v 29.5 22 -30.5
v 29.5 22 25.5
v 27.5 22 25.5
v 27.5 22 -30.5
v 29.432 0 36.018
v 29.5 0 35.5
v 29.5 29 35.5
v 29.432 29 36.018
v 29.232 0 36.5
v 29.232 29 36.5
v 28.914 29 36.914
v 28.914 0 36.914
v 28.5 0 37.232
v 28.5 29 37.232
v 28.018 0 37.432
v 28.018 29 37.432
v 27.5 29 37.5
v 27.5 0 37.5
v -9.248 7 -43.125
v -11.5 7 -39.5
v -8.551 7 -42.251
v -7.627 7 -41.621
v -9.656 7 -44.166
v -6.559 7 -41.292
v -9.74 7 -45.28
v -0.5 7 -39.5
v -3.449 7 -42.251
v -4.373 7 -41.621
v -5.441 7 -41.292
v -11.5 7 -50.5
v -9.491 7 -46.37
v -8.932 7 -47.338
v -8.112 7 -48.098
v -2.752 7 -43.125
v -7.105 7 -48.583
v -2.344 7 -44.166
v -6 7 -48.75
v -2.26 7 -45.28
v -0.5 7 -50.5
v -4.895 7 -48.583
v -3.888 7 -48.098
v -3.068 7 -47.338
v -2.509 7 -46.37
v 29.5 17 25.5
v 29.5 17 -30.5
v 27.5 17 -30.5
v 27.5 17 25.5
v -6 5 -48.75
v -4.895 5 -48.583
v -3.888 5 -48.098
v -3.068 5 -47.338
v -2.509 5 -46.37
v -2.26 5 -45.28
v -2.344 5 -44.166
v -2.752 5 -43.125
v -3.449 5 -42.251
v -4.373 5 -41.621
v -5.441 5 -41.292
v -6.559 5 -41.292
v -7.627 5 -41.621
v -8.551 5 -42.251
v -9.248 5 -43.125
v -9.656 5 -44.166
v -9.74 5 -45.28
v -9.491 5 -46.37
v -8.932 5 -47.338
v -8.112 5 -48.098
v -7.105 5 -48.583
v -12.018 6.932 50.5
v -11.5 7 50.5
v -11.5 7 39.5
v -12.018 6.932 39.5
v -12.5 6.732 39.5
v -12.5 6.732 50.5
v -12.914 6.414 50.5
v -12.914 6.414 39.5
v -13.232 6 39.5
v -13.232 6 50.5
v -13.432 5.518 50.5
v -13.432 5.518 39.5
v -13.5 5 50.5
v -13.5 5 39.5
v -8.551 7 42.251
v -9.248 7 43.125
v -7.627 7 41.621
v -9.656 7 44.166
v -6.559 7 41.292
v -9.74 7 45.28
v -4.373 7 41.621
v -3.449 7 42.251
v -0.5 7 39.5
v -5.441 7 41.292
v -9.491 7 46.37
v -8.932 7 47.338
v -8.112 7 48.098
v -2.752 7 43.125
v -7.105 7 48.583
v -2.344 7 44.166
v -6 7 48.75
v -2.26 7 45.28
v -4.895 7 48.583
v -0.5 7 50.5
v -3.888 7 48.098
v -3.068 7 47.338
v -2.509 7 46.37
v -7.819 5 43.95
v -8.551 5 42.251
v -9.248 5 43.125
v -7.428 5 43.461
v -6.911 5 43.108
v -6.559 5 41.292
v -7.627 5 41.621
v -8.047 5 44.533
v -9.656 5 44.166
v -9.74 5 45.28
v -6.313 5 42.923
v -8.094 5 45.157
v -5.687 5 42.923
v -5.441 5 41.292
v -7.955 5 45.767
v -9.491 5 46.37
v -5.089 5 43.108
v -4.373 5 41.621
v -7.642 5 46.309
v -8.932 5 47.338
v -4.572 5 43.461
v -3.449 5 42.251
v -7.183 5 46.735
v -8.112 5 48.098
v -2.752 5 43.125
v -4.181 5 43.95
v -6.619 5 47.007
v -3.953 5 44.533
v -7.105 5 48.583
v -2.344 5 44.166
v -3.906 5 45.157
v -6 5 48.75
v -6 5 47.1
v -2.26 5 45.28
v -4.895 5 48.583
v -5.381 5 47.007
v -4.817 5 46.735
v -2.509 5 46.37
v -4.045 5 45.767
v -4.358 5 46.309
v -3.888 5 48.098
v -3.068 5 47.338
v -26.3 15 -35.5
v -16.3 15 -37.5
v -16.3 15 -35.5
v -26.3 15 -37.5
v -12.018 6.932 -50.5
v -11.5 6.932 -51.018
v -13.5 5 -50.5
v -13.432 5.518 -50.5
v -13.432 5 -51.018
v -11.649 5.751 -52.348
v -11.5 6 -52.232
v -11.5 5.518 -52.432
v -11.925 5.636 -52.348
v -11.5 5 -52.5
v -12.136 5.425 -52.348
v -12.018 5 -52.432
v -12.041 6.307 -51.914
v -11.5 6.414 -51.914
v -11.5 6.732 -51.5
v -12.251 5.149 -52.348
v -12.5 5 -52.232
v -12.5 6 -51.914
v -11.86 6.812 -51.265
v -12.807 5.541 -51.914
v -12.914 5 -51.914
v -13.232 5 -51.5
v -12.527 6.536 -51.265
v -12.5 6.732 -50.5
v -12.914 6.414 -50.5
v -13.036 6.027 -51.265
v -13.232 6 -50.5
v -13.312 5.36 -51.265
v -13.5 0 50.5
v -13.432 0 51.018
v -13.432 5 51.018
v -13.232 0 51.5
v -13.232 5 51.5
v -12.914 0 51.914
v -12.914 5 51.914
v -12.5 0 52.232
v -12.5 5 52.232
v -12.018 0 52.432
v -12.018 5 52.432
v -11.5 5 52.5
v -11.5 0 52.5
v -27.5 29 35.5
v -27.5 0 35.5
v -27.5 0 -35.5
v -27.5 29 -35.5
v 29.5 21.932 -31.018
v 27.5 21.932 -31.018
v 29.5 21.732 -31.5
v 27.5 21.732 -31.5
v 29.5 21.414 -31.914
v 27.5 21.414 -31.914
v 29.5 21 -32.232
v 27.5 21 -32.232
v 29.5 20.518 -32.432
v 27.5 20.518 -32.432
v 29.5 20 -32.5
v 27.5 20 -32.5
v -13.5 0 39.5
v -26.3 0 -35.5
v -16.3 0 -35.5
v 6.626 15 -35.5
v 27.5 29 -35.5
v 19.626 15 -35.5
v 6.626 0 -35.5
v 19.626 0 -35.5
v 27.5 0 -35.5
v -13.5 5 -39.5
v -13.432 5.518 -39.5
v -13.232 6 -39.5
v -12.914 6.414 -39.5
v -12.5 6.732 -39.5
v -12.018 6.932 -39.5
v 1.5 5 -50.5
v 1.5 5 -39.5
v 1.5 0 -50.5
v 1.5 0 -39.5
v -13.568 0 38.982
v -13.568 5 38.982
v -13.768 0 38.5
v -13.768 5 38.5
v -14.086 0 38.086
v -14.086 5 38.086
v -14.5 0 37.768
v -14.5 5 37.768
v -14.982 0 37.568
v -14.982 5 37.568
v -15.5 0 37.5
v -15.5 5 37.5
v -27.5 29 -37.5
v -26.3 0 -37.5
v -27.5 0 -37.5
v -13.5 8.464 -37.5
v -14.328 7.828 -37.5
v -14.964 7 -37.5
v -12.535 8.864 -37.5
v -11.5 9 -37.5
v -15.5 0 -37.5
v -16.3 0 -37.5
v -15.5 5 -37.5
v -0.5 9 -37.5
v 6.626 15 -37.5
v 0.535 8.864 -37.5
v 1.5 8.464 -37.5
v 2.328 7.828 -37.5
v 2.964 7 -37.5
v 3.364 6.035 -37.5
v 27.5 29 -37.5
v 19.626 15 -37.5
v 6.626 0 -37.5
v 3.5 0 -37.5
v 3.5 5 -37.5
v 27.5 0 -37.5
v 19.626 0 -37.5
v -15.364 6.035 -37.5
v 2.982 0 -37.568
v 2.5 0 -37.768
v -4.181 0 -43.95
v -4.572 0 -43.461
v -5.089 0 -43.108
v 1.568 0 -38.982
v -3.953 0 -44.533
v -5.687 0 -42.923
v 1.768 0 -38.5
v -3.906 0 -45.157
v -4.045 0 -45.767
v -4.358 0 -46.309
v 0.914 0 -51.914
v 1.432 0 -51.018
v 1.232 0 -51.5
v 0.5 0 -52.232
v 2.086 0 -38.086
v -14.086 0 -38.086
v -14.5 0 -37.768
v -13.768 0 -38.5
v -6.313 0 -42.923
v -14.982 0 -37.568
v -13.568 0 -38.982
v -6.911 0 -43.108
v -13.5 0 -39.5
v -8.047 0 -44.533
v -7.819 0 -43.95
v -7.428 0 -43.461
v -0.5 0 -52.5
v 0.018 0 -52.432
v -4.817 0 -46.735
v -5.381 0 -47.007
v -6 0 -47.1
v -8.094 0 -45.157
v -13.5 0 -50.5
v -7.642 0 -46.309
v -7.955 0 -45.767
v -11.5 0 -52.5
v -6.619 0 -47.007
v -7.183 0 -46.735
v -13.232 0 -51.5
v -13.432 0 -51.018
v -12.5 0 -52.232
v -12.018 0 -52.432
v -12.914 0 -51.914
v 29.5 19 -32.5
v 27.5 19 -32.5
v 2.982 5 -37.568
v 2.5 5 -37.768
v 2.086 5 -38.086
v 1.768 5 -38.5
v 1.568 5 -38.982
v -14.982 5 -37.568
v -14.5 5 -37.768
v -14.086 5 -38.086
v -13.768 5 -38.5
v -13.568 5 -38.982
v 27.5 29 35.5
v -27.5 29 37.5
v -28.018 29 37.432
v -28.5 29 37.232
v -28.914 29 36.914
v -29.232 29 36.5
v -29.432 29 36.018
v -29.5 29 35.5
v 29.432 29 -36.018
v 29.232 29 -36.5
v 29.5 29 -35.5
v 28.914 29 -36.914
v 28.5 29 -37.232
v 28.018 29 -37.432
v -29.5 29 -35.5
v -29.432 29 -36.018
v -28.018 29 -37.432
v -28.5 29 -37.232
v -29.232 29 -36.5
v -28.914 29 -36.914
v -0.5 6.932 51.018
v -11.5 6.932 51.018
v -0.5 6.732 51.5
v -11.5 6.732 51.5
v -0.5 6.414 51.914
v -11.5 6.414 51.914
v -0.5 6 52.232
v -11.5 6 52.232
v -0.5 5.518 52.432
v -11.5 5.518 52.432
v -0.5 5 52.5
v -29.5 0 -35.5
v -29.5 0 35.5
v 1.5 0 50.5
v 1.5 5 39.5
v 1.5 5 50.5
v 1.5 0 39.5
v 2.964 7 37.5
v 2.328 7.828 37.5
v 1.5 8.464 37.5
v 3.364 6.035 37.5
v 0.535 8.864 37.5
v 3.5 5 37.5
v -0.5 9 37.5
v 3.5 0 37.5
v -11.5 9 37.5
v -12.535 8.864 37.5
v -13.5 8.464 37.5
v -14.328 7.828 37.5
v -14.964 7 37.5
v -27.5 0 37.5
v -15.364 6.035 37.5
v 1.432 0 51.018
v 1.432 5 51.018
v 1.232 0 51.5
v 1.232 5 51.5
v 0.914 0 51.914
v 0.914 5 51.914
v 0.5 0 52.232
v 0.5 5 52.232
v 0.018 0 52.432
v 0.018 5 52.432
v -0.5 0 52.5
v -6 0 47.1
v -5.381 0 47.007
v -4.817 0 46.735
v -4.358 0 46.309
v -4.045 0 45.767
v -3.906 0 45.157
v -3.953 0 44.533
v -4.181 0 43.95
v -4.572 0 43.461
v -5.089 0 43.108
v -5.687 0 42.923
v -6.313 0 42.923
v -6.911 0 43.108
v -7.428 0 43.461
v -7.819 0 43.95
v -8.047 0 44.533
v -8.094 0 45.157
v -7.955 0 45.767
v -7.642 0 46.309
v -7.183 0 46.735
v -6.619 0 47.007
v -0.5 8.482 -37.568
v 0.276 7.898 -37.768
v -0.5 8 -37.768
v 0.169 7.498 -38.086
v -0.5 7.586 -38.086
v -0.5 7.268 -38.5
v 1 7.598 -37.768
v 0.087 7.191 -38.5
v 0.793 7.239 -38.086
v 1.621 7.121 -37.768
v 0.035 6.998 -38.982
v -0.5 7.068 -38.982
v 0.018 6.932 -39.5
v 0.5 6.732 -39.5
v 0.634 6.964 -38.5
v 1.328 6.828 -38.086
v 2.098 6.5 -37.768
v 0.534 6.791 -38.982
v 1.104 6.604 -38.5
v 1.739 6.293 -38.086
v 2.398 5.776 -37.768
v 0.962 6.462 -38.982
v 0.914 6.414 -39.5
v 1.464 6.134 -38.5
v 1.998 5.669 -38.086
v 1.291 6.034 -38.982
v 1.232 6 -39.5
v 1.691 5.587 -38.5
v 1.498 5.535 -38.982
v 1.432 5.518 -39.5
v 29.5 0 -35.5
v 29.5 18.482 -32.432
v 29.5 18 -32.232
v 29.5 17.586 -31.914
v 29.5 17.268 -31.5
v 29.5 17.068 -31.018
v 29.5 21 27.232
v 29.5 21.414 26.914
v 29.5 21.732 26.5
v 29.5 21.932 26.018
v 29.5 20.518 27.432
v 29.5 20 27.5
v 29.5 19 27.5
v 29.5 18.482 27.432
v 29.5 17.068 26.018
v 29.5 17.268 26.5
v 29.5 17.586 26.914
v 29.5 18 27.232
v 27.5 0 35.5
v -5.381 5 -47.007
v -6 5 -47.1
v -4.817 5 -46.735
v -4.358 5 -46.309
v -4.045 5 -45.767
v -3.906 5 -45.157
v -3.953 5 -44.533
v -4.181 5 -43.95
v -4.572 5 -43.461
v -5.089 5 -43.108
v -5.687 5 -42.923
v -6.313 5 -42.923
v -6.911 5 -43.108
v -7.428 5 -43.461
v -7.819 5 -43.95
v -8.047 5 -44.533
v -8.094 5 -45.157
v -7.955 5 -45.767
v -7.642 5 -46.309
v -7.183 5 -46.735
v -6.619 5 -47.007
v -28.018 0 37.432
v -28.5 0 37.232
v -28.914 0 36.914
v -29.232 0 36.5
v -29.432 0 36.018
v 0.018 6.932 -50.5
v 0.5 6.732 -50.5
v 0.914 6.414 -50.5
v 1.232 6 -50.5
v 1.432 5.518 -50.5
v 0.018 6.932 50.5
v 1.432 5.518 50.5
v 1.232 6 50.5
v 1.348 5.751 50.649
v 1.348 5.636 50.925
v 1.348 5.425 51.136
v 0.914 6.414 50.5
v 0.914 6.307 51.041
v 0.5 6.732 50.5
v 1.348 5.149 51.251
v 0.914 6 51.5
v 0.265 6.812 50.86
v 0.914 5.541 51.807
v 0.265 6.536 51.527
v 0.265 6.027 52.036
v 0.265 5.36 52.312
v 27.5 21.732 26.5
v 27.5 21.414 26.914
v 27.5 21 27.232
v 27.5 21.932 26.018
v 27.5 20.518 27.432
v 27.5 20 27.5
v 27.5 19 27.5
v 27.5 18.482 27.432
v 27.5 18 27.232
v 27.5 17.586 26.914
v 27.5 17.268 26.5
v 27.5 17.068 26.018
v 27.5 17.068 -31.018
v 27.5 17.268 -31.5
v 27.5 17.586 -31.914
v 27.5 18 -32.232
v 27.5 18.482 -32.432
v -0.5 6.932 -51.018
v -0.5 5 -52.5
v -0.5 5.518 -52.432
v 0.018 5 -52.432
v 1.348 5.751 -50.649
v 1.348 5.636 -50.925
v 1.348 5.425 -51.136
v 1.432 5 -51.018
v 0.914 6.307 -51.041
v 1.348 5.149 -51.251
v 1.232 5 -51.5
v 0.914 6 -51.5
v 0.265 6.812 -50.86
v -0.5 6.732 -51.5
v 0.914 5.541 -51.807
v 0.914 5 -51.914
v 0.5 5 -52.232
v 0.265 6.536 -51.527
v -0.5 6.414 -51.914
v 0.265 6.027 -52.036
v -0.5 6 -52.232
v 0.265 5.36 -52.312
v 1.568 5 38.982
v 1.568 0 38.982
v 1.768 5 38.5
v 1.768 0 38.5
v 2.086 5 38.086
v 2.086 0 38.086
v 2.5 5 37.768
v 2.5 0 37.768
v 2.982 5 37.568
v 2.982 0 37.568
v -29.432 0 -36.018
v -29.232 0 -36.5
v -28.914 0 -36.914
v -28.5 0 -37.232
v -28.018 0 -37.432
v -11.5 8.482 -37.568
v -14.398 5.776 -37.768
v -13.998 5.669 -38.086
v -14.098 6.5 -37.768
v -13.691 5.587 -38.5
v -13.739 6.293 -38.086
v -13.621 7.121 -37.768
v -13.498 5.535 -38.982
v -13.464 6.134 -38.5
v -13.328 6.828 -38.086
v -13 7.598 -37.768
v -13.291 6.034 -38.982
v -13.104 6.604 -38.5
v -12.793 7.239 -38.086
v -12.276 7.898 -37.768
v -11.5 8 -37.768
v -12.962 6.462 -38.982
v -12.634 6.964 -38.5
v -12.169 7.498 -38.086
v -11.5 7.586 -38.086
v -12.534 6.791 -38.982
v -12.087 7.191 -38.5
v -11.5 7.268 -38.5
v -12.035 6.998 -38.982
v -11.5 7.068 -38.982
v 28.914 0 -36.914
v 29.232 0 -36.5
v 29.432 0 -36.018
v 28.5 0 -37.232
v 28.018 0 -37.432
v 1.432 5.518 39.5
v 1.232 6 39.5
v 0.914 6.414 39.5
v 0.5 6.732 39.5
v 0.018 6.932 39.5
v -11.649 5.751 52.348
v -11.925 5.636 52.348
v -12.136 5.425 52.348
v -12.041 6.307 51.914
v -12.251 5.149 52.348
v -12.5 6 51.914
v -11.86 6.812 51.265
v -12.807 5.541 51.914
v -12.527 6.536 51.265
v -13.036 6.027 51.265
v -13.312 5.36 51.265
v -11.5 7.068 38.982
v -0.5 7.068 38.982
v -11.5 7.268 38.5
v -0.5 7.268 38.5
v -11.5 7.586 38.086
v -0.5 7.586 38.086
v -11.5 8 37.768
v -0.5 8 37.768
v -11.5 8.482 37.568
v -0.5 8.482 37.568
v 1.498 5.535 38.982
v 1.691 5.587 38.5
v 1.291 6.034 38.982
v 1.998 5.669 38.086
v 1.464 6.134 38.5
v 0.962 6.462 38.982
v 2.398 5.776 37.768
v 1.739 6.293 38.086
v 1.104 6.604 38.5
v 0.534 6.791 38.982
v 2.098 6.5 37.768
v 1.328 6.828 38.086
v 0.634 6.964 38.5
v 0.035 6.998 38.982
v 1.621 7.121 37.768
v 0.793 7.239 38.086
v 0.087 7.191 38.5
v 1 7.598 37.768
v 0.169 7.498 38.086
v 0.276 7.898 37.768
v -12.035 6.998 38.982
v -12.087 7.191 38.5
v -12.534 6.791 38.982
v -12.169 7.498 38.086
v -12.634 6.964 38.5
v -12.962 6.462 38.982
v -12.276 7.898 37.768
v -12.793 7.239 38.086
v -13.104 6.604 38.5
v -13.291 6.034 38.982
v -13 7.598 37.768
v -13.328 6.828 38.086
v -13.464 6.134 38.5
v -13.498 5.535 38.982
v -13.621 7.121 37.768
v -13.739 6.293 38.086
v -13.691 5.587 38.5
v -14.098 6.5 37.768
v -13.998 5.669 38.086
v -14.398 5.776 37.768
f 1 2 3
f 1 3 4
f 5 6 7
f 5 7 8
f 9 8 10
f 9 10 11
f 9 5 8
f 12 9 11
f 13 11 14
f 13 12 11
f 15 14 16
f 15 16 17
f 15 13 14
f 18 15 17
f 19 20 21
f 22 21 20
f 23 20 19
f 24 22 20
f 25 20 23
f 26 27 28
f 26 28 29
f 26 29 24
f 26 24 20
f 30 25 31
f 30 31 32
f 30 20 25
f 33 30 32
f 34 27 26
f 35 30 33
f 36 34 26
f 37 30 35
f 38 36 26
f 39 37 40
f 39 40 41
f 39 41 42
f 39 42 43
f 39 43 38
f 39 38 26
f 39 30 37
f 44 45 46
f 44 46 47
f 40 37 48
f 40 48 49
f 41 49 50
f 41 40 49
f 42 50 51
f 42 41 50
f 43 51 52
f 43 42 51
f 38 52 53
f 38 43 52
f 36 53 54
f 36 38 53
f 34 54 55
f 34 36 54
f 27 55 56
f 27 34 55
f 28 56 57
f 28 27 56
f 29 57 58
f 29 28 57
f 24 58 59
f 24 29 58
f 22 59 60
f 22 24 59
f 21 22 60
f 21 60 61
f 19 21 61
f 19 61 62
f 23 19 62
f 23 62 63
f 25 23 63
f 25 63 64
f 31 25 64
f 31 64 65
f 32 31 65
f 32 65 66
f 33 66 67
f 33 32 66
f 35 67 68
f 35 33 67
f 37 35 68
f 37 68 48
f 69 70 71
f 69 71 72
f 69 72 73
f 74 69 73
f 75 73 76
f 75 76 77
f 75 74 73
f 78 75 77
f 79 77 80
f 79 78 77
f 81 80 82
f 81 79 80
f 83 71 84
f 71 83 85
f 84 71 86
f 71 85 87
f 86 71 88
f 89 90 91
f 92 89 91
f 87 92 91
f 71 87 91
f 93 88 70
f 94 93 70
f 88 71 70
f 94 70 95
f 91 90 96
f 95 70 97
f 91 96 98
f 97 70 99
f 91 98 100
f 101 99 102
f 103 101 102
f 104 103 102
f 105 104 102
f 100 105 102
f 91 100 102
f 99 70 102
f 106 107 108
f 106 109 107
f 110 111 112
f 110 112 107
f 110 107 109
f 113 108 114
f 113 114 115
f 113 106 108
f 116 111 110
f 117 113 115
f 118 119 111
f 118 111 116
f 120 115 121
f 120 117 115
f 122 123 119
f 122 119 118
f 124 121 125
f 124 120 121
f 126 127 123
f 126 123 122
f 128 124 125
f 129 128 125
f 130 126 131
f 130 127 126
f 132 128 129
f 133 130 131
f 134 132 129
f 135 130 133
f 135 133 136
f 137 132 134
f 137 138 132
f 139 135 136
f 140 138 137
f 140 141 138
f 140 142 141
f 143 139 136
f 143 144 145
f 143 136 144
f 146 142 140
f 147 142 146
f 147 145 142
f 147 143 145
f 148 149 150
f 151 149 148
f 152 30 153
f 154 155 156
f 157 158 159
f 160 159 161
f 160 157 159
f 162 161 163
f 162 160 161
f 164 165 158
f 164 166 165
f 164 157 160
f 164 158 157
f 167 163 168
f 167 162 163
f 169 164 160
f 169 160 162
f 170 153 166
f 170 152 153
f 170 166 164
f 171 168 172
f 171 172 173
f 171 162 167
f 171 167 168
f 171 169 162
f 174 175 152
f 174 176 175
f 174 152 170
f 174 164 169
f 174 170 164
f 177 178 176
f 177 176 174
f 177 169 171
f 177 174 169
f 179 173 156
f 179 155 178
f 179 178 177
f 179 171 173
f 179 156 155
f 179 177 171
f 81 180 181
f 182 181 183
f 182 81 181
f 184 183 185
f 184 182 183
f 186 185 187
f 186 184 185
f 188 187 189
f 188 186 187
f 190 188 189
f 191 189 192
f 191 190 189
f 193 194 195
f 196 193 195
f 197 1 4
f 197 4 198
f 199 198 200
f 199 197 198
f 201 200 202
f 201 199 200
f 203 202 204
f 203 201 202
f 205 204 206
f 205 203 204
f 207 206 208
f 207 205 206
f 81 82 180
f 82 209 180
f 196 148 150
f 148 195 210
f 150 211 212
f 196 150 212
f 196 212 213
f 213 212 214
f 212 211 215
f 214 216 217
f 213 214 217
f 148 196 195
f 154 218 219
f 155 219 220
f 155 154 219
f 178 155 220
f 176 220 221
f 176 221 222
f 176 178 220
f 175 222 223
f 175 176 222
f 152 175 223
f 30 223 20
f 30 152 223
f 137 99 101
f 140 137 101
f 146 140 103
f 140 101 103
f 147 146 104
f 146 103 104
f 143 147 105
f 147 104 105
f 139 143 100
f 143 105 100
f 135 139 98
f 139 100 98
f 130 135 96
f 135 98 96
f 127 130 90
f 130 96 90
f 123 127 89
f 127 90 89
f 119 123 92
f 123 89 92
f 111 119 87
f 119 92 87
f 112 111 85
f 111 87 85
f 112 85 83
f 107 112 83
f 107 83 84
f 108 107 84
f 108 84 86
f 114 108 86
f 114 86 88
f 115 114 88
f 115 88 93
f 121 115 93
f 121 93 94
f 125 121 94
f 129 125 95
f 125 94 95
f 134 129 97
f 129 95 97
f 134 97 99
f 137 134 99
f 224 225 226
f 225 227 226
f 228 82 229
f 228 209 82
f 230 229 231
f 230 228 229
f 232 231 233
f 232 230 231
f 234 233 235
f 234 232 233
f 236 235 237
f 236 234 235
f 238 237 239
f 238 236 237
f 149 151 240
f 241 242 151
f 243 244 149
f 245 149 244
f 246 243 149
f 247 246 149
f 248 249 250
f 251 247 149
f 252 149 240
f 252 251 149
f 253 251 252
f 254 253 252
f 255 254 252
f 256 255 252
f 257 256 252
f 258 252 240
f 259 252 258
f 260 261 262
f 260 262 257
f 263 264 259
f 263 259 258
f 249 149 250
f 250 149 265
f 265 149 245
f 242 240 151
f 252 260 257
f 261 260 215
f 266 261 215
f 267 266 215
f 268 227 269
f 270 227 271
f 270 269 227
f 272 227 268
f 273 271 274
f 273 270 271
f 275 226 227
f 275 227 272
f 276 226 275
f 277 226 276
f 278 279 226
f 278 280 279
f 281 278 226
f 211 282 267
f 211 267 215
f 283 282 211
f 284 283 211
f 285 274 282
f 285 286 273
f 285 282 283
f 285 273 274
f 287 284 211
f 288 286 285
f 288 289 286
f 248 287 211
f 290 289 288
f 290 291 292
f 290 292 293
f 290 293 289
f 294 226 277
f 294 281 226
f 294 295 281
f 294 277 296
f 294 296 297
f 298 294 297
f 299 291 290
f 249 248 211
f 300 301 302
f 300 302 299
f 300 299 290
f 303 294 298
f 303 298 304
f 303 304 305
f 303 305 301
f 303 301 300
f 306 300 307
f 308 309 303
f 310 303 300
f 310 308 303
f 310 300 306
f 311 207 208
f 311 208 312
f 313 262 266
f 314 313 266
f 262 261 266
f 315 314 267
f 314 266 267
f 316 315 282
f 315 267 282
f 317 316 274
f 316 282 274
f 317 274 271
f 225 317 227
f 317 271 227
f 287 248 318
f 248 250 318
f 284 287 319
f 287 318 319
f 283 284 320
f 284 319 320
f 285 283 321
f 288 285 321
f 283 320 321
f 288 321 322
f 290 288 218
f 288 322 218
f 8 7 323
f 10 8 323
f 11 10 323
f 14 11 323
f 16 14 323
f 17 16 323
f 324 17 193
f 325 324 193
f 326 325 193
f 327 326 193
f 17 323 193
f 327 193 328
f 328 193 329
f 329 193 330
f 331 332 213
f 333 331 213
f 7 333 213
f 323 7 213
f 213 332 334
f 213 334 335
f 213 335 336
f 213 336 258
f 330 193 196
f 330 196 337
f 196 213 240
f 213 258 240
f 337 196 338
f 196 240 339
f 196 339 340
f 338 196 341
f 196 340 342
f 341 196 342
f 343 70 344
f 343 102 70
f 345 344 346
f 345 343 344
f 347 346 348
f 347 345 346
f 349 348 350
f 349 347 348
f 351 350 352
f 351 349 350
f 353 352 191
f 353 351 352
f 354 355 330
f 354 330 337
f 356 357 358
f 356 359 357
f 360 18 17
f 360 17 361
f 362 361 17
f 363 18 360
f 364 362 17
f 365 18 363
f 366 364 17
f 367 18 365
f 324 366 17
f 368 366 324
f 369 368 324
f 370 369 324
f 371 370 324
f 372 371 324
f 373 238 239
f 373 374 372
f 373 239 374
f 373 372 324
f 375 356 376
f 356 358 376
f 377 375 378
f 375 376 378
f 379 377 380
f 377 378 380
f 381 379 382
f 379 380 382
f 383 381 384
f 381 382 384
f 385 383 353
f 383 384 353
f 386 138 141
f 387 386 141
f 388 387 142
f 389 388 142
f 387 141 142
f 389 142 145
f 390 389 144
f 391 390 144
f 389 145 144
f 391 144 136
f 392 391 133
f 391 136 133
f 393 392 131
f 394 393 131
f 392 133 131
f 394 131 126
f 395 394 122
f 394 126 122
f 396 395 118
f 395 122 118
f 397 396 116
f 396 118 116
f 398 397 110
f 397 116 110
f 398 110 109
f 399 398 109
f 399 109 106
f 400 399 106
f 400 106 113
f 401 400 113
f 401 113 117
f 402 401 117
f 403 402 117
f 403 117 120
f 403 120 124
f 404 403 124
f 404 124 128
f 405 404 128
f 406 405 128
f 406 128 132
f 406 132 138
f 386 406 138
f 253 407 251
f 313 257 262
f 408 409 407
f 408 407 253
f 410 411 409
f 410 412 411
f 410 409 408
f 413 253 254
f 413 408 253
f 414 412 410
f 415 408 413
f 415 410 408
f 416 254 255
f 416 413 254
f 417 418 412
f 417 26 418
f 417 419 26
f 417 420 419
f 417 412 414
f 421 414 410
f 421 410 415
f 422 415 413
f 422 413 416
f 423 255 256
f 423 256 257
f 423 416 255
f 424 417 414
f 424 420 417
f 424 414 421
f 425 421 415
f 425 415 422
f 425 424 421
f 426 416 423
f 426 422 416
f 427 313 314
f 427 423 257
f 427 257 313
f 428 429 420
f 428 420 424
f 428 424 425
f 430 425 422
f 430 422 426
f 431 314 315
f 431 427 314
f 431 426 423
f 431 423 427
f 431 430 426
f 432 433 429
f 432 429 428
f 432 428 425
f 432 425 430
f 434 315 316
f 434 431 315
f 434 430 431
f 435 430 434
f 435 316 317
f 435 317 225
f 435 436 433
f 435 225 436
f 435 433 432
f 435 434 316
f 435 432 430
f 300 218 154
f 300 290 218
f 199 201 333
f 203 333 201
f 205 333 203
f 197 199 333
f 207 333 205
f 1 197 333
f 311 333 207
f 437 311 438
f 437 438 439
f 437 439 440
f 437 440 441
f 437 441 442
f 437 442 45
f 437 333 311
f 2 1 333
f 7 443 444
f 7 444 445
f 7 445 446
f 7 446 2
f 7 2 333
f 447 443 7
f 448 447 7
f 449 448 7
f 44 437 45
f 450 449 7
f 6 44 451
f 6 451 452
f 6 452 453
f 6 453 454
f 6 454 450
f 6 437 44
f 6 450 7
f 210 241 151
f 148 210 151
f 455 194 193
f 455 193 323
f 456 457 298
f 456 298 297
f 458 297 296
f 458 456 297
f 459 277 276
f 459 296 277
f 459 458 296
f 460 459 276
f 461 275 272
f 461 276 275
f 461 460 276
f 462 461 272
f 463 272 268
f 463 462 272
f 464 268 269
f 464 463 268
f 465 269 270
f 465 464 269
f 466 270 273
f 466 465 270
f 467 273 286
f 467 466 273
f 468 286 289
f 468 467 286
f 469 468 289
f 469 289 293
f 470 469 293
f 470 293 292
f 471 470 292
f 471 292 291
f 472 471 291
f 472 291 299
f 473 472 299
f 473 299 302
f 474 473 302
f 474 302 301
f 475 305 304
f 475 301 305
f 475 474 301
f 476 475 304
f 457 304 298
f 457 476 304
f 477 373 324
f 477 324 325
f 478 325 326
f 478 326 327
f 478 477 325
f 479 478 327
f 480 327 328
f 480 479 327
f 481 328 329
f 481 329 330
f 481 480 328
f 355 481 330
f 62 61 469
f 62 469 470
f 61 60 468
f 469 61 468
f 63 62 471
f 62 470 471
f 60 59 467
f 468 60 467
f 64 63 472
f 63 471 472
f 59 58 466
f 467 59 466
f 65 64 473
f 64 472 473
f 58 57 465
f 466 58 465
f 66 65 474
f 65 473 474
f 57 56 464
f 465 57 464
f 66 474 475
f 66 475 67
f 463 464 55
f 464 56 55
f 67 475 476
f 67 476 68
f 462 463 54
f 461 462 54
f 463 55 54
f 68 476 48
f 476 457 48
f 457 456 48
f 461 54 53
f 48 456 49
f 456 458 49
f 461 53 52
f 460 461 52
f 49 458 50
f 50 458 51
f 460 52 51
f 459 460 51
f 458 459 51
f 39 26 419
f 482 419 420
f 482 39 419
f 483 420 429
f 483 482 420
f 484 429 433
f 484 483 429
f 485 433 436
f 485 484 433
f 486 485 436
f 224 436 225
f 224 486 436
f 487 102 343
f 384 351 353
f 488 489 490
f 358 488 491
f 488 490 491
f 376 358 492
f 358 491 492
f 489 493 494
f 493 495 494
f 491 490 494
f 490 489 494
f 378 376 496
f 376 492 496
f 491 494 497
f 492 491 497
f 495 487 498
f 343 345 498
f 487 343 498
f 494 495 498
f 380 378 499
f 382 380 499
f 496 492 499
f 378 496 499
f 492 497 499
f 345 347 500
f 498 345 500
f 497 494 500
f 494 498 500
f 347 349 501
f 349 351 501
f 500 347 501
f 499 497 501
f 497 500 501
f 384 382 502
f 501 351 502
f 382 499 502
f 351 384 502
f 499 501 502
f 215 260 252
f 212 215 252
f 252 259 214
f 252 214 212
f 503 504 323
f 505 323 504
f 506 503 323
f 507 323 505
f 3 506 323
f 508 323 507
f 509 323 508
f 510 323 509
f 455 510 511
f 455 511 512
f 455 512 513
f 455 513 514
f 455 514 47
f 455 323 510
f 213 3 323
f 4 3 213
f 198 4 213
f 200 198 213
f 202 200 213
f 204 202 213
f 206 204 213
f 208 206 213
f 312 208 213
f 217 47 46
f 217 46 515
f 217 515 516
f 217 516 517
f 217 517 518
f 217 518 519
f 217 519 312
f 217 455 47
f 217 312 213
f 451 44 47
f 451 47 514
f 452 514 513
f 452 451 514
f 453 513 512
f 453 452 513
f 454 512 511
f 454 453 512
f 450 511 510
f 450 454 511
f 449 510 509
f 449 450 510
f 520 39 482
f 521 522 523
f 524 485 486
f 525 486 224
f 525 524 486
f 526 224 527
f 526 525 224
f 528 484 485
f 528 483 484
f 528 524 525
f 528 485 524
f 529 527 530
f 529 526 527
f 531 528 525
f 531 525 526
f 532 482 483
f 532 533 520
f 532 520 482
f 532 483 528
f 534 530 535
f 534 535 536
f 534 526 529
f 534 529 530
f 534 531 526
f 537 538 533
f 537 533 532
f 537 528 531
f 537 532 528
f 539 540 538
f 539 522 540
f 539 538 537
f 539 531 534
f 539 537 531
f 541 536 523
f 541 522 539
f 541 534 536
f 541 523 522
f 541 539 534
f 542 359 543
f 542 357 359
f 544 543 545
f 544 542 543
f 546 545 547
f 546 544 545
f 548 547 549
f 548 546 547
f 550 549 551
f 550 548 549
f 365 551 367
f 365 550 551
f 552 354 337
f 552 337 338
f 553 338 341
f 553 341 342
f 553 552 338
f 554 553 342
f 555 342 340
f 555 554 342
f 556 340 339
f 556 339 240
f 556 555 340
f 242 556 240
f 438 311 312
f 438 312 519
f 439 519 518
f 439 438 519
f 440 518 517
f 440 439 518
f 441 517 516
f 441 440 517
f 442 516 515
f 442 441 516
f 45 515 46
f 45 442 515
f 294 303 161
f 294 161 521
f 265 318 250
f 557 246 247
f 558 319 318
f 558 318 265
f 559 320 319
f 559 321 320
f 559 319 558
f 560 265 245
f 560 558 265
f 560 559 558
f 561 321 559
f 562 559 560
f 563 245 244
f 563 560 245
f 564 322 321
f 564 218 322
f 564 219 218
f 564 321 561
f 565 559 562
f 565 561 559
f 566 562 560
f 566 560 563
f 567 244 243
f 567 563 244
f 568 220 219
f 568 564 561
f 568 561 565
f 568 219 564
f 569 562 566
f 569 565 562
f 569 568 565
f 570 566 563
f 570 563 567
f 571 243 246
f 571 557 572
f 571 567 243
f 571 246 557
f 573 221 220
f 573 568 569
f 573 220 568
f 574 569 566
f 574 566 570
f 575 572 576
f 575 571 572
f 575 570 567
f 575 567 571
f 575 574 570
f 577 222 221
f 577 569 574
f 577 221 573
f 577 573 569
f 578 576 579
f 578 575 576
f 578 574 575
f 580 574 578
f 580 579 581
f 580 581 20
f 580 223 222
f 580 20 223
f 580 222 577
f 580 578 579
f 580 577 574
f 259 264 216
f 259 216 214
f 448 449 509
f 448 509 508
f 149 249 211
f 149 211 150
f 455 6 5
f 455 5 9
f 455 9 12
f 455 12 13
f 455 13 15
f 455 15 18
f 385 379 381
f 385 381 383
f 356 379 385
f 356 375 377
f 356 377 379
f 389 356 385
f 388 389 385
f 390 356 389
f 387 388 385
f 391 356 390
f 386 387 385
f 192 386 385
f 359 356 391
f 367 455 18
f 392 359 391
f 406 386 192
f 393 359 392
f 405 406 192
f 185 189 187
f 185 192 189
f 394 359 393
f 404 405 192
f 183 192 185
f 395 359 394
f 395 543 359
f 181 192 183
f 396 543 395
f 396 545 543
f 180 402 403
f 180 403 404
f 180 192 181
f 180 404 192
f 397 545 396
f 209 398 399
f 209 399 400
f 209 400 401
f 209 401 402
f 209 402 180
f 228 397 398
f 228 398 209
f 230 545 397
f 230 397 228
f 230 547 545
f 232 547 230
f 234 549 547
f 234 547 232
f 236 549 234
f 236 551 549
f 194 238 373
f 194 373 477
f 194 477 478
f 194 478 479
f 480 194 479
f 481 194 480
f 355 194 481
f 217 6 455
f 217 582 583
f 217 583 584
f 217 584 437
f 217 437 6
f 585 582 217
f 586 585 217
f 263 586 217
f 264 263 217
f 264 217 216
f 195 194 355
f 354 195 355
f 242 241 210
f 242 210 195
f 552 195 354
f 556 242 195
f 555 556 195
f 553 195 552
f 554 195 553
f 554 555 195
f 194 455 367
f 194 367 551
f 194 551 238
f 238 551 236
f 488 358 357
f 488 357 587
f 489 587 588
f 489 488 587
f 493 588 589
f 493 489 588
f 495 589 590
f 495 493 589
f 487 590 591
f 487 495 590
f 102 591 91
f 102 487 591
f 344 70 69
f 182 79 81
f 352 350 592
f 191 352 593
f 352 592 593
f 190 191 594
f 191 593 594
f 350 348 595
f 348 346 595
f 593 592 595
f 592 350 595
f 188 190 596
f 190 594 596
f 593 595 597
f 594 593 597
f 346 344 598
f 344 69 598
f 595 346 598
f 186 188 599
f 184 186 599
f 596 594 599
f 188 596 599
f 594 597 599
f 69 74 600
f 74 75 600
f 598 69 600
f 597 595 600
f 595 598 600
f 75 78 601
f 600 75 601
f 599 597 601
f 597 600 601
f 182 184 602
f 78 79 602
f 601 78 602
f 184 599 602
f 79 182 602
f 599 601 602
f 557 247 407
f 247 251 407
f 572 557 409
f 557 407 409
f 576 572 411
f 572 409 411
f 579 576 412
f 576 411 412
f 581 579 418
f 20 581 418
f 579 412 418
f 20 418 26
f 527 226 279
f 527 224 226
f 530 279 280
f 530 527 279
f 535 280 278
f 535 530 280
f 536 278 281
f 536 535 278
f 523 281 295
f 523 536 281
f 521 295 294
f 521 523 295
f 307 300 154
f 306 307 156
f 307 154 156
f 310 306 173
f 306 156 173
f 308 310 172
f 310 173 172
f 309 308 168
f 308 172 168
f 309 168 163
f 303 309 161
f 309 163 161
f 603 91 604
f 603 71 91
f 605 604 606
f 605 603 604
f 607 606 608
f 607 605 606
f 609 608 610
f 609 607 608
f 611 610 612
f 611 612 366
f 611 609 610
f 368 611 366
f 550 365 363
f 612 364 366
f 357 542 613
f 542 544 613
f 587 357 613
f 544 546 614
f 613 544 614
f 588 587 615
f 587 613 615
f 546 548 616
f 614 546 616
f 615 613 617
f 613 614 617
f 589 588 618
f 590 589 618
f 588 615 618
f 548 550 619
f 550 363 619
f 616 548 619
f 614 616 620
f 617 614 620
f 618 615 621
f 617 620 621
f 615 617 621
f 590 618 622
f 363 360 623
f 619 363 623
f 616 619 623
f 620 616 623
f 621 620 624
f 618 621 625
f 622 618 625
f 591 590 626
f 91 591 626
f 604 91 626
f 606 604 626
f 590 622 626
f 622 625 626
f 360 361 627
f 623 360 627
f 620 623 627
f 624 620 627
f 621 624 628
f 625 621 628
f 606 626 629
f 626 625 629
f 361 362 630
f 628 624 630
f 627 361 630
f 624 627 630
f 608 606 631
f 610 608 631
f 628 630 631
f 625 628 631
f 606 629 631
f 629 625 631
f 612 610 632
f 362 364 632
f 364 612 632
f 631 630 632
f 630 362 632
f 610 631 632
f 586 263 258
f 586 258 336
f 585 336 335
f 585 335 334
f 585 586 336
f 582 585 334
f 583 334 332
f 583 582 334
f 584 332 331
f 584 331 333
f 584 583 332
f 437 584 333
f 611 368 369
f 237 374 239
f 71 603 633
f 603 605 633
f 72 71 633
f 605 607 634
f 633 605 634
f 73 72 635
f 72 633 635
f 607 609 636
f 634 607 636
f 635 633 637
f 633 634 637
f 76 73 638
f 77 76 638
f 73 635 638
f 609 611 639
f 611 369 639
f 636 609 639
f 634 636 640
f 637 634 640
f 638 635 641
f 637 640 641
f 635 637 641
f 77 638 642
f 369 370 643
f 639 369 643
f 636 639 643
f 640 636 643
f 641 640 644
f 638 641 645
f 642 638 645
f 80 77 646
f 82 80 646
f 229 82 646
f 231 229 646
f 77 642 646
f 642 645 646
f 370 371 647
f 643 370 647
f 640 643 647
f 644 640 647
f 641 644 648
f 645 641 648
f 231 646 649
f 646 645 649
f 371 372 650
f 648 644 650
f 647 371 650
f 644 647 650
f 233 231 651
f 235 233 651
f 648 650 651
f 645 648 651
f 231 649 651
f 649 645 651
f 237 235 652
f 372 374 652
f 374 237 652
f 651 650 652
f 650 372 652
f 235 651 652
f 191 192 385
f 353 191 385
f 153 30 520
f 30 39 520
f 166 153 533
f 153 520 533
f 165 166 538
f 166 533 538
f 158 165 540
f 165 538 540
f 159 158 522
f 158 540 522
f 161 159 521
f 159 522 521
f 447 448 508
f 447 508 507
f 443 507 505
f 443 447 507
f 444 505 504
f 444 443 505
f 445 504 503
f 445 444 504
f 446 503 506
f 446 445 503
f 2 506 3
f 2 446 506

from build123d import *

# Parameters (mm, degrees)
SKETCH1_W            = 55
SKETCH1_H            = 71
BOSS_EXTRUDE1_DEPTH  = 29
SKETCH2_W            = 13
SKETCH2_H            = 15
SKETCH2_W_2          = 10
CUT_EXTRUDE1_DEPTH   = 27
CUT_EXTRUDE2_DEPTH   = 27
SKETCH4_W            = 15
SKETCH4_H            = 15
BOSS_EXTRUDE2_DEPTH  = 7
FILLET1_R            = 2
SKETCH5_R            = 2.1
CUT_EXTRUDE3_DEPTH   = 15
SKETCH6_R            = 3.75
CUT_EXTRUDE4_DEPTH   = 2
FILLET1_OF_MIRROR2_R = 2
FILLET2_R            = 2


with BuildPart() as part:
    # Sketch1 → Boss-Extrude1 (new body)
    with BuildSketch(Plane(origin=(0, 0, 0), x_dir=(1, 0, 0), z_dir=(0, 1, 0))):
        with BuildLine():
            Line((-27.5, 37.5), (27.5, 37.5))
            ThreePointArc((27.5, 37.5), (28.914213562, 36.914213562), (29.5, 35.5))
            Line((29.5, 35.5), (29.5, -35.5))
            ThreePointArc((29.5, -35.5), (28.914213562, -36.914213562), (27.5, -37.5))
            Line((27.5, -37.5), (-27.5, -37.5))
            ThreePointArc((-27.5, -37.5), (-28.914213562, -36.914213562), (-29.5, -35.5))
            Line((-29.5, -35.5), (-29.5, 35.5))
            ThreePointArc((-29.5, 35.5), (-28.914213562, 36.914213562), (-27.5, 37.5))
        make_face()
        Rectangle(SKETCH1_W, SKETCH1_H, mode=Mode.SUBTRACT)
    extrude(amount=BOSS_EXTRUDE1_DEPTH)

    # Sketch2 → Cut-Extrude1 (cut)
    with BuildSketch(Plane(origin=(0, 0, -37.5), x_dir=(-1, 0, 0), z_dir=(0, 0, -1))):
        with Locations((-13.12561668, 7.5)):
            Rectangle(SKETCH2_W, SKETCH2_H)
        with Locations((21.3, 7.5)):
            Rectangle(SKETCH2_W_2, SKETCH2_H)
    extrude(amount=-CUT_EXTRUDE1_DEPTH, mode=Mode.SUBTRACT)

    # Sketch3 → Cut-Extrude2 (cut)
    with BuildSketch(Plane(origin=(29.5, 0, 0), x_dir=(0, 0, -1), z_dir=(1, 0, 0))):
        with BuildLine():
            Line((-25.5, 22), (30.5, 22))
            ThreePointArc((30.5, 22), (31.914213562, 21.414213562), (32.5, 20))
            Line((32.5, 20), (32.5, 19))
            ThreePointArc((32.5, 19), (31.914213562, 17.585786438), (30.5, 17))
            Line((30.5, 17), (-25.5, 17))
            ThreePointArc((-25.5, 17), (-26.914213562, 17.585786438), (-27.5, 19))
            Line((-27.5, 19), (-27.5, 20))
            ThreePointArc((-27.5, 20), (-26.914213562, 21.414213562), (-25.5, 22))
        make_face()
    extrude(amount=-CUT_EXTRUDE2_DEPTH, mode=Mode.SUBTRACT)

    # Sketch4 → Boss-Extrude2 (add)
    with BuildSketch(Plane.XZ):
        with Locations((-6, 45)):
            Rectangle(SKETCH4_W, SKETCH4_H)
    boss_extrude2 = extrude(amount=-BOSS_EXTRUDE2_DEPTH)

    # Fillet1
    fillet1_edges = [part.edges().sort_by_distance(p)[0] for p in [
        (-13.5, 7, 45),
        (-6, 7, 52.5),
        (-13.5, 3.5, 52.5),
        (1.5, 7, 45),
        (1.5, 3.5, 52.5),
    ]]
    fillet(fillet1_edges, radius=FILLET1_R)

    # Sketch5 → Cut-Extrude3 (cut)
    with BuildSketch(Plane(origin=(0, 7, 0), x_dir=(1, 0, 0), z_dir=(0, 1, 0))):
        with Locations(Location((-6, -45, 0), (0, 0, 270))):  # turned: the seam where the file's is
            Circle(SKETCH5_R)
    cut_extrude3 = extrude(amount=-CUT_EXTRUDE3_DEPTH, mode=Mode.SUBTRACT)

    # Sketch6 → Cut-Extrude4 (cut)
    with BuildSketch(Plane(origin=(0, 7, 0), x_dir=(1, 0, 0), z_dir=(0, 1, 0))):
        with Locations(Location((-6, -45, 0), (0, 0, 270))):  # turned: the seam where the file's is
            Circle(SKETCH6_R)
    cut_extrude4 = extrude(amount=-CUT_EXTRUDE4_DEPTH, mode=Mode.SUBTRACT)

    # Mirror2: Boss-Extrude2, Cut-Extrude3, Cut-Extrude4 across plane
    add(boss_extrude2.mirror(Plane.XY))
    add(cut_extrude3.mirror(Plane.XY), mode=Mode.SUBTRACT)
    add(cut_extrude4.mirror(Plane.XY), mode=Mode.SUBTRACT)

    # Fillet1 of Mirror2
    fillet1_of_mirror2_edges = [part.edges().sort_by_distance(p)[0] for p in [
        (-13.5, 7, -45),
        (-6, 7, -52.5),
        (-13.5, 3.5, -52.5),
        (1.5, 7, -45),
        (1.5, 3.5, -52.5),
    ]]
    fillet(fillet1_of_mirror2_edges, radius=FILLET1_OF_MIRROR2_R)

    # Fillet2
    fillet2_edges = [part.edges().sort_by_distance(p)[0] for p in [
        (1.5, 2.5, 37.5),
        (-6, 7, 37.5),
        (-13.5, 2.5, 37.5),
        (0.914213562, 6.414213562, 37.5),
        (-12.914213562, 6.414213562, 37.5),
        (-6, 7, -37.5),
        (1.5, 2.5, -37.5),
        (-13.5, 2.5, -37.5),
        (0.914213562, 6.414213562, -37.5),
        (-12.914213562, 6.414213562, -37.5),
    ]]
    fillet(fillet2_edges, radius=FILLET2_R)


solid = part.part
